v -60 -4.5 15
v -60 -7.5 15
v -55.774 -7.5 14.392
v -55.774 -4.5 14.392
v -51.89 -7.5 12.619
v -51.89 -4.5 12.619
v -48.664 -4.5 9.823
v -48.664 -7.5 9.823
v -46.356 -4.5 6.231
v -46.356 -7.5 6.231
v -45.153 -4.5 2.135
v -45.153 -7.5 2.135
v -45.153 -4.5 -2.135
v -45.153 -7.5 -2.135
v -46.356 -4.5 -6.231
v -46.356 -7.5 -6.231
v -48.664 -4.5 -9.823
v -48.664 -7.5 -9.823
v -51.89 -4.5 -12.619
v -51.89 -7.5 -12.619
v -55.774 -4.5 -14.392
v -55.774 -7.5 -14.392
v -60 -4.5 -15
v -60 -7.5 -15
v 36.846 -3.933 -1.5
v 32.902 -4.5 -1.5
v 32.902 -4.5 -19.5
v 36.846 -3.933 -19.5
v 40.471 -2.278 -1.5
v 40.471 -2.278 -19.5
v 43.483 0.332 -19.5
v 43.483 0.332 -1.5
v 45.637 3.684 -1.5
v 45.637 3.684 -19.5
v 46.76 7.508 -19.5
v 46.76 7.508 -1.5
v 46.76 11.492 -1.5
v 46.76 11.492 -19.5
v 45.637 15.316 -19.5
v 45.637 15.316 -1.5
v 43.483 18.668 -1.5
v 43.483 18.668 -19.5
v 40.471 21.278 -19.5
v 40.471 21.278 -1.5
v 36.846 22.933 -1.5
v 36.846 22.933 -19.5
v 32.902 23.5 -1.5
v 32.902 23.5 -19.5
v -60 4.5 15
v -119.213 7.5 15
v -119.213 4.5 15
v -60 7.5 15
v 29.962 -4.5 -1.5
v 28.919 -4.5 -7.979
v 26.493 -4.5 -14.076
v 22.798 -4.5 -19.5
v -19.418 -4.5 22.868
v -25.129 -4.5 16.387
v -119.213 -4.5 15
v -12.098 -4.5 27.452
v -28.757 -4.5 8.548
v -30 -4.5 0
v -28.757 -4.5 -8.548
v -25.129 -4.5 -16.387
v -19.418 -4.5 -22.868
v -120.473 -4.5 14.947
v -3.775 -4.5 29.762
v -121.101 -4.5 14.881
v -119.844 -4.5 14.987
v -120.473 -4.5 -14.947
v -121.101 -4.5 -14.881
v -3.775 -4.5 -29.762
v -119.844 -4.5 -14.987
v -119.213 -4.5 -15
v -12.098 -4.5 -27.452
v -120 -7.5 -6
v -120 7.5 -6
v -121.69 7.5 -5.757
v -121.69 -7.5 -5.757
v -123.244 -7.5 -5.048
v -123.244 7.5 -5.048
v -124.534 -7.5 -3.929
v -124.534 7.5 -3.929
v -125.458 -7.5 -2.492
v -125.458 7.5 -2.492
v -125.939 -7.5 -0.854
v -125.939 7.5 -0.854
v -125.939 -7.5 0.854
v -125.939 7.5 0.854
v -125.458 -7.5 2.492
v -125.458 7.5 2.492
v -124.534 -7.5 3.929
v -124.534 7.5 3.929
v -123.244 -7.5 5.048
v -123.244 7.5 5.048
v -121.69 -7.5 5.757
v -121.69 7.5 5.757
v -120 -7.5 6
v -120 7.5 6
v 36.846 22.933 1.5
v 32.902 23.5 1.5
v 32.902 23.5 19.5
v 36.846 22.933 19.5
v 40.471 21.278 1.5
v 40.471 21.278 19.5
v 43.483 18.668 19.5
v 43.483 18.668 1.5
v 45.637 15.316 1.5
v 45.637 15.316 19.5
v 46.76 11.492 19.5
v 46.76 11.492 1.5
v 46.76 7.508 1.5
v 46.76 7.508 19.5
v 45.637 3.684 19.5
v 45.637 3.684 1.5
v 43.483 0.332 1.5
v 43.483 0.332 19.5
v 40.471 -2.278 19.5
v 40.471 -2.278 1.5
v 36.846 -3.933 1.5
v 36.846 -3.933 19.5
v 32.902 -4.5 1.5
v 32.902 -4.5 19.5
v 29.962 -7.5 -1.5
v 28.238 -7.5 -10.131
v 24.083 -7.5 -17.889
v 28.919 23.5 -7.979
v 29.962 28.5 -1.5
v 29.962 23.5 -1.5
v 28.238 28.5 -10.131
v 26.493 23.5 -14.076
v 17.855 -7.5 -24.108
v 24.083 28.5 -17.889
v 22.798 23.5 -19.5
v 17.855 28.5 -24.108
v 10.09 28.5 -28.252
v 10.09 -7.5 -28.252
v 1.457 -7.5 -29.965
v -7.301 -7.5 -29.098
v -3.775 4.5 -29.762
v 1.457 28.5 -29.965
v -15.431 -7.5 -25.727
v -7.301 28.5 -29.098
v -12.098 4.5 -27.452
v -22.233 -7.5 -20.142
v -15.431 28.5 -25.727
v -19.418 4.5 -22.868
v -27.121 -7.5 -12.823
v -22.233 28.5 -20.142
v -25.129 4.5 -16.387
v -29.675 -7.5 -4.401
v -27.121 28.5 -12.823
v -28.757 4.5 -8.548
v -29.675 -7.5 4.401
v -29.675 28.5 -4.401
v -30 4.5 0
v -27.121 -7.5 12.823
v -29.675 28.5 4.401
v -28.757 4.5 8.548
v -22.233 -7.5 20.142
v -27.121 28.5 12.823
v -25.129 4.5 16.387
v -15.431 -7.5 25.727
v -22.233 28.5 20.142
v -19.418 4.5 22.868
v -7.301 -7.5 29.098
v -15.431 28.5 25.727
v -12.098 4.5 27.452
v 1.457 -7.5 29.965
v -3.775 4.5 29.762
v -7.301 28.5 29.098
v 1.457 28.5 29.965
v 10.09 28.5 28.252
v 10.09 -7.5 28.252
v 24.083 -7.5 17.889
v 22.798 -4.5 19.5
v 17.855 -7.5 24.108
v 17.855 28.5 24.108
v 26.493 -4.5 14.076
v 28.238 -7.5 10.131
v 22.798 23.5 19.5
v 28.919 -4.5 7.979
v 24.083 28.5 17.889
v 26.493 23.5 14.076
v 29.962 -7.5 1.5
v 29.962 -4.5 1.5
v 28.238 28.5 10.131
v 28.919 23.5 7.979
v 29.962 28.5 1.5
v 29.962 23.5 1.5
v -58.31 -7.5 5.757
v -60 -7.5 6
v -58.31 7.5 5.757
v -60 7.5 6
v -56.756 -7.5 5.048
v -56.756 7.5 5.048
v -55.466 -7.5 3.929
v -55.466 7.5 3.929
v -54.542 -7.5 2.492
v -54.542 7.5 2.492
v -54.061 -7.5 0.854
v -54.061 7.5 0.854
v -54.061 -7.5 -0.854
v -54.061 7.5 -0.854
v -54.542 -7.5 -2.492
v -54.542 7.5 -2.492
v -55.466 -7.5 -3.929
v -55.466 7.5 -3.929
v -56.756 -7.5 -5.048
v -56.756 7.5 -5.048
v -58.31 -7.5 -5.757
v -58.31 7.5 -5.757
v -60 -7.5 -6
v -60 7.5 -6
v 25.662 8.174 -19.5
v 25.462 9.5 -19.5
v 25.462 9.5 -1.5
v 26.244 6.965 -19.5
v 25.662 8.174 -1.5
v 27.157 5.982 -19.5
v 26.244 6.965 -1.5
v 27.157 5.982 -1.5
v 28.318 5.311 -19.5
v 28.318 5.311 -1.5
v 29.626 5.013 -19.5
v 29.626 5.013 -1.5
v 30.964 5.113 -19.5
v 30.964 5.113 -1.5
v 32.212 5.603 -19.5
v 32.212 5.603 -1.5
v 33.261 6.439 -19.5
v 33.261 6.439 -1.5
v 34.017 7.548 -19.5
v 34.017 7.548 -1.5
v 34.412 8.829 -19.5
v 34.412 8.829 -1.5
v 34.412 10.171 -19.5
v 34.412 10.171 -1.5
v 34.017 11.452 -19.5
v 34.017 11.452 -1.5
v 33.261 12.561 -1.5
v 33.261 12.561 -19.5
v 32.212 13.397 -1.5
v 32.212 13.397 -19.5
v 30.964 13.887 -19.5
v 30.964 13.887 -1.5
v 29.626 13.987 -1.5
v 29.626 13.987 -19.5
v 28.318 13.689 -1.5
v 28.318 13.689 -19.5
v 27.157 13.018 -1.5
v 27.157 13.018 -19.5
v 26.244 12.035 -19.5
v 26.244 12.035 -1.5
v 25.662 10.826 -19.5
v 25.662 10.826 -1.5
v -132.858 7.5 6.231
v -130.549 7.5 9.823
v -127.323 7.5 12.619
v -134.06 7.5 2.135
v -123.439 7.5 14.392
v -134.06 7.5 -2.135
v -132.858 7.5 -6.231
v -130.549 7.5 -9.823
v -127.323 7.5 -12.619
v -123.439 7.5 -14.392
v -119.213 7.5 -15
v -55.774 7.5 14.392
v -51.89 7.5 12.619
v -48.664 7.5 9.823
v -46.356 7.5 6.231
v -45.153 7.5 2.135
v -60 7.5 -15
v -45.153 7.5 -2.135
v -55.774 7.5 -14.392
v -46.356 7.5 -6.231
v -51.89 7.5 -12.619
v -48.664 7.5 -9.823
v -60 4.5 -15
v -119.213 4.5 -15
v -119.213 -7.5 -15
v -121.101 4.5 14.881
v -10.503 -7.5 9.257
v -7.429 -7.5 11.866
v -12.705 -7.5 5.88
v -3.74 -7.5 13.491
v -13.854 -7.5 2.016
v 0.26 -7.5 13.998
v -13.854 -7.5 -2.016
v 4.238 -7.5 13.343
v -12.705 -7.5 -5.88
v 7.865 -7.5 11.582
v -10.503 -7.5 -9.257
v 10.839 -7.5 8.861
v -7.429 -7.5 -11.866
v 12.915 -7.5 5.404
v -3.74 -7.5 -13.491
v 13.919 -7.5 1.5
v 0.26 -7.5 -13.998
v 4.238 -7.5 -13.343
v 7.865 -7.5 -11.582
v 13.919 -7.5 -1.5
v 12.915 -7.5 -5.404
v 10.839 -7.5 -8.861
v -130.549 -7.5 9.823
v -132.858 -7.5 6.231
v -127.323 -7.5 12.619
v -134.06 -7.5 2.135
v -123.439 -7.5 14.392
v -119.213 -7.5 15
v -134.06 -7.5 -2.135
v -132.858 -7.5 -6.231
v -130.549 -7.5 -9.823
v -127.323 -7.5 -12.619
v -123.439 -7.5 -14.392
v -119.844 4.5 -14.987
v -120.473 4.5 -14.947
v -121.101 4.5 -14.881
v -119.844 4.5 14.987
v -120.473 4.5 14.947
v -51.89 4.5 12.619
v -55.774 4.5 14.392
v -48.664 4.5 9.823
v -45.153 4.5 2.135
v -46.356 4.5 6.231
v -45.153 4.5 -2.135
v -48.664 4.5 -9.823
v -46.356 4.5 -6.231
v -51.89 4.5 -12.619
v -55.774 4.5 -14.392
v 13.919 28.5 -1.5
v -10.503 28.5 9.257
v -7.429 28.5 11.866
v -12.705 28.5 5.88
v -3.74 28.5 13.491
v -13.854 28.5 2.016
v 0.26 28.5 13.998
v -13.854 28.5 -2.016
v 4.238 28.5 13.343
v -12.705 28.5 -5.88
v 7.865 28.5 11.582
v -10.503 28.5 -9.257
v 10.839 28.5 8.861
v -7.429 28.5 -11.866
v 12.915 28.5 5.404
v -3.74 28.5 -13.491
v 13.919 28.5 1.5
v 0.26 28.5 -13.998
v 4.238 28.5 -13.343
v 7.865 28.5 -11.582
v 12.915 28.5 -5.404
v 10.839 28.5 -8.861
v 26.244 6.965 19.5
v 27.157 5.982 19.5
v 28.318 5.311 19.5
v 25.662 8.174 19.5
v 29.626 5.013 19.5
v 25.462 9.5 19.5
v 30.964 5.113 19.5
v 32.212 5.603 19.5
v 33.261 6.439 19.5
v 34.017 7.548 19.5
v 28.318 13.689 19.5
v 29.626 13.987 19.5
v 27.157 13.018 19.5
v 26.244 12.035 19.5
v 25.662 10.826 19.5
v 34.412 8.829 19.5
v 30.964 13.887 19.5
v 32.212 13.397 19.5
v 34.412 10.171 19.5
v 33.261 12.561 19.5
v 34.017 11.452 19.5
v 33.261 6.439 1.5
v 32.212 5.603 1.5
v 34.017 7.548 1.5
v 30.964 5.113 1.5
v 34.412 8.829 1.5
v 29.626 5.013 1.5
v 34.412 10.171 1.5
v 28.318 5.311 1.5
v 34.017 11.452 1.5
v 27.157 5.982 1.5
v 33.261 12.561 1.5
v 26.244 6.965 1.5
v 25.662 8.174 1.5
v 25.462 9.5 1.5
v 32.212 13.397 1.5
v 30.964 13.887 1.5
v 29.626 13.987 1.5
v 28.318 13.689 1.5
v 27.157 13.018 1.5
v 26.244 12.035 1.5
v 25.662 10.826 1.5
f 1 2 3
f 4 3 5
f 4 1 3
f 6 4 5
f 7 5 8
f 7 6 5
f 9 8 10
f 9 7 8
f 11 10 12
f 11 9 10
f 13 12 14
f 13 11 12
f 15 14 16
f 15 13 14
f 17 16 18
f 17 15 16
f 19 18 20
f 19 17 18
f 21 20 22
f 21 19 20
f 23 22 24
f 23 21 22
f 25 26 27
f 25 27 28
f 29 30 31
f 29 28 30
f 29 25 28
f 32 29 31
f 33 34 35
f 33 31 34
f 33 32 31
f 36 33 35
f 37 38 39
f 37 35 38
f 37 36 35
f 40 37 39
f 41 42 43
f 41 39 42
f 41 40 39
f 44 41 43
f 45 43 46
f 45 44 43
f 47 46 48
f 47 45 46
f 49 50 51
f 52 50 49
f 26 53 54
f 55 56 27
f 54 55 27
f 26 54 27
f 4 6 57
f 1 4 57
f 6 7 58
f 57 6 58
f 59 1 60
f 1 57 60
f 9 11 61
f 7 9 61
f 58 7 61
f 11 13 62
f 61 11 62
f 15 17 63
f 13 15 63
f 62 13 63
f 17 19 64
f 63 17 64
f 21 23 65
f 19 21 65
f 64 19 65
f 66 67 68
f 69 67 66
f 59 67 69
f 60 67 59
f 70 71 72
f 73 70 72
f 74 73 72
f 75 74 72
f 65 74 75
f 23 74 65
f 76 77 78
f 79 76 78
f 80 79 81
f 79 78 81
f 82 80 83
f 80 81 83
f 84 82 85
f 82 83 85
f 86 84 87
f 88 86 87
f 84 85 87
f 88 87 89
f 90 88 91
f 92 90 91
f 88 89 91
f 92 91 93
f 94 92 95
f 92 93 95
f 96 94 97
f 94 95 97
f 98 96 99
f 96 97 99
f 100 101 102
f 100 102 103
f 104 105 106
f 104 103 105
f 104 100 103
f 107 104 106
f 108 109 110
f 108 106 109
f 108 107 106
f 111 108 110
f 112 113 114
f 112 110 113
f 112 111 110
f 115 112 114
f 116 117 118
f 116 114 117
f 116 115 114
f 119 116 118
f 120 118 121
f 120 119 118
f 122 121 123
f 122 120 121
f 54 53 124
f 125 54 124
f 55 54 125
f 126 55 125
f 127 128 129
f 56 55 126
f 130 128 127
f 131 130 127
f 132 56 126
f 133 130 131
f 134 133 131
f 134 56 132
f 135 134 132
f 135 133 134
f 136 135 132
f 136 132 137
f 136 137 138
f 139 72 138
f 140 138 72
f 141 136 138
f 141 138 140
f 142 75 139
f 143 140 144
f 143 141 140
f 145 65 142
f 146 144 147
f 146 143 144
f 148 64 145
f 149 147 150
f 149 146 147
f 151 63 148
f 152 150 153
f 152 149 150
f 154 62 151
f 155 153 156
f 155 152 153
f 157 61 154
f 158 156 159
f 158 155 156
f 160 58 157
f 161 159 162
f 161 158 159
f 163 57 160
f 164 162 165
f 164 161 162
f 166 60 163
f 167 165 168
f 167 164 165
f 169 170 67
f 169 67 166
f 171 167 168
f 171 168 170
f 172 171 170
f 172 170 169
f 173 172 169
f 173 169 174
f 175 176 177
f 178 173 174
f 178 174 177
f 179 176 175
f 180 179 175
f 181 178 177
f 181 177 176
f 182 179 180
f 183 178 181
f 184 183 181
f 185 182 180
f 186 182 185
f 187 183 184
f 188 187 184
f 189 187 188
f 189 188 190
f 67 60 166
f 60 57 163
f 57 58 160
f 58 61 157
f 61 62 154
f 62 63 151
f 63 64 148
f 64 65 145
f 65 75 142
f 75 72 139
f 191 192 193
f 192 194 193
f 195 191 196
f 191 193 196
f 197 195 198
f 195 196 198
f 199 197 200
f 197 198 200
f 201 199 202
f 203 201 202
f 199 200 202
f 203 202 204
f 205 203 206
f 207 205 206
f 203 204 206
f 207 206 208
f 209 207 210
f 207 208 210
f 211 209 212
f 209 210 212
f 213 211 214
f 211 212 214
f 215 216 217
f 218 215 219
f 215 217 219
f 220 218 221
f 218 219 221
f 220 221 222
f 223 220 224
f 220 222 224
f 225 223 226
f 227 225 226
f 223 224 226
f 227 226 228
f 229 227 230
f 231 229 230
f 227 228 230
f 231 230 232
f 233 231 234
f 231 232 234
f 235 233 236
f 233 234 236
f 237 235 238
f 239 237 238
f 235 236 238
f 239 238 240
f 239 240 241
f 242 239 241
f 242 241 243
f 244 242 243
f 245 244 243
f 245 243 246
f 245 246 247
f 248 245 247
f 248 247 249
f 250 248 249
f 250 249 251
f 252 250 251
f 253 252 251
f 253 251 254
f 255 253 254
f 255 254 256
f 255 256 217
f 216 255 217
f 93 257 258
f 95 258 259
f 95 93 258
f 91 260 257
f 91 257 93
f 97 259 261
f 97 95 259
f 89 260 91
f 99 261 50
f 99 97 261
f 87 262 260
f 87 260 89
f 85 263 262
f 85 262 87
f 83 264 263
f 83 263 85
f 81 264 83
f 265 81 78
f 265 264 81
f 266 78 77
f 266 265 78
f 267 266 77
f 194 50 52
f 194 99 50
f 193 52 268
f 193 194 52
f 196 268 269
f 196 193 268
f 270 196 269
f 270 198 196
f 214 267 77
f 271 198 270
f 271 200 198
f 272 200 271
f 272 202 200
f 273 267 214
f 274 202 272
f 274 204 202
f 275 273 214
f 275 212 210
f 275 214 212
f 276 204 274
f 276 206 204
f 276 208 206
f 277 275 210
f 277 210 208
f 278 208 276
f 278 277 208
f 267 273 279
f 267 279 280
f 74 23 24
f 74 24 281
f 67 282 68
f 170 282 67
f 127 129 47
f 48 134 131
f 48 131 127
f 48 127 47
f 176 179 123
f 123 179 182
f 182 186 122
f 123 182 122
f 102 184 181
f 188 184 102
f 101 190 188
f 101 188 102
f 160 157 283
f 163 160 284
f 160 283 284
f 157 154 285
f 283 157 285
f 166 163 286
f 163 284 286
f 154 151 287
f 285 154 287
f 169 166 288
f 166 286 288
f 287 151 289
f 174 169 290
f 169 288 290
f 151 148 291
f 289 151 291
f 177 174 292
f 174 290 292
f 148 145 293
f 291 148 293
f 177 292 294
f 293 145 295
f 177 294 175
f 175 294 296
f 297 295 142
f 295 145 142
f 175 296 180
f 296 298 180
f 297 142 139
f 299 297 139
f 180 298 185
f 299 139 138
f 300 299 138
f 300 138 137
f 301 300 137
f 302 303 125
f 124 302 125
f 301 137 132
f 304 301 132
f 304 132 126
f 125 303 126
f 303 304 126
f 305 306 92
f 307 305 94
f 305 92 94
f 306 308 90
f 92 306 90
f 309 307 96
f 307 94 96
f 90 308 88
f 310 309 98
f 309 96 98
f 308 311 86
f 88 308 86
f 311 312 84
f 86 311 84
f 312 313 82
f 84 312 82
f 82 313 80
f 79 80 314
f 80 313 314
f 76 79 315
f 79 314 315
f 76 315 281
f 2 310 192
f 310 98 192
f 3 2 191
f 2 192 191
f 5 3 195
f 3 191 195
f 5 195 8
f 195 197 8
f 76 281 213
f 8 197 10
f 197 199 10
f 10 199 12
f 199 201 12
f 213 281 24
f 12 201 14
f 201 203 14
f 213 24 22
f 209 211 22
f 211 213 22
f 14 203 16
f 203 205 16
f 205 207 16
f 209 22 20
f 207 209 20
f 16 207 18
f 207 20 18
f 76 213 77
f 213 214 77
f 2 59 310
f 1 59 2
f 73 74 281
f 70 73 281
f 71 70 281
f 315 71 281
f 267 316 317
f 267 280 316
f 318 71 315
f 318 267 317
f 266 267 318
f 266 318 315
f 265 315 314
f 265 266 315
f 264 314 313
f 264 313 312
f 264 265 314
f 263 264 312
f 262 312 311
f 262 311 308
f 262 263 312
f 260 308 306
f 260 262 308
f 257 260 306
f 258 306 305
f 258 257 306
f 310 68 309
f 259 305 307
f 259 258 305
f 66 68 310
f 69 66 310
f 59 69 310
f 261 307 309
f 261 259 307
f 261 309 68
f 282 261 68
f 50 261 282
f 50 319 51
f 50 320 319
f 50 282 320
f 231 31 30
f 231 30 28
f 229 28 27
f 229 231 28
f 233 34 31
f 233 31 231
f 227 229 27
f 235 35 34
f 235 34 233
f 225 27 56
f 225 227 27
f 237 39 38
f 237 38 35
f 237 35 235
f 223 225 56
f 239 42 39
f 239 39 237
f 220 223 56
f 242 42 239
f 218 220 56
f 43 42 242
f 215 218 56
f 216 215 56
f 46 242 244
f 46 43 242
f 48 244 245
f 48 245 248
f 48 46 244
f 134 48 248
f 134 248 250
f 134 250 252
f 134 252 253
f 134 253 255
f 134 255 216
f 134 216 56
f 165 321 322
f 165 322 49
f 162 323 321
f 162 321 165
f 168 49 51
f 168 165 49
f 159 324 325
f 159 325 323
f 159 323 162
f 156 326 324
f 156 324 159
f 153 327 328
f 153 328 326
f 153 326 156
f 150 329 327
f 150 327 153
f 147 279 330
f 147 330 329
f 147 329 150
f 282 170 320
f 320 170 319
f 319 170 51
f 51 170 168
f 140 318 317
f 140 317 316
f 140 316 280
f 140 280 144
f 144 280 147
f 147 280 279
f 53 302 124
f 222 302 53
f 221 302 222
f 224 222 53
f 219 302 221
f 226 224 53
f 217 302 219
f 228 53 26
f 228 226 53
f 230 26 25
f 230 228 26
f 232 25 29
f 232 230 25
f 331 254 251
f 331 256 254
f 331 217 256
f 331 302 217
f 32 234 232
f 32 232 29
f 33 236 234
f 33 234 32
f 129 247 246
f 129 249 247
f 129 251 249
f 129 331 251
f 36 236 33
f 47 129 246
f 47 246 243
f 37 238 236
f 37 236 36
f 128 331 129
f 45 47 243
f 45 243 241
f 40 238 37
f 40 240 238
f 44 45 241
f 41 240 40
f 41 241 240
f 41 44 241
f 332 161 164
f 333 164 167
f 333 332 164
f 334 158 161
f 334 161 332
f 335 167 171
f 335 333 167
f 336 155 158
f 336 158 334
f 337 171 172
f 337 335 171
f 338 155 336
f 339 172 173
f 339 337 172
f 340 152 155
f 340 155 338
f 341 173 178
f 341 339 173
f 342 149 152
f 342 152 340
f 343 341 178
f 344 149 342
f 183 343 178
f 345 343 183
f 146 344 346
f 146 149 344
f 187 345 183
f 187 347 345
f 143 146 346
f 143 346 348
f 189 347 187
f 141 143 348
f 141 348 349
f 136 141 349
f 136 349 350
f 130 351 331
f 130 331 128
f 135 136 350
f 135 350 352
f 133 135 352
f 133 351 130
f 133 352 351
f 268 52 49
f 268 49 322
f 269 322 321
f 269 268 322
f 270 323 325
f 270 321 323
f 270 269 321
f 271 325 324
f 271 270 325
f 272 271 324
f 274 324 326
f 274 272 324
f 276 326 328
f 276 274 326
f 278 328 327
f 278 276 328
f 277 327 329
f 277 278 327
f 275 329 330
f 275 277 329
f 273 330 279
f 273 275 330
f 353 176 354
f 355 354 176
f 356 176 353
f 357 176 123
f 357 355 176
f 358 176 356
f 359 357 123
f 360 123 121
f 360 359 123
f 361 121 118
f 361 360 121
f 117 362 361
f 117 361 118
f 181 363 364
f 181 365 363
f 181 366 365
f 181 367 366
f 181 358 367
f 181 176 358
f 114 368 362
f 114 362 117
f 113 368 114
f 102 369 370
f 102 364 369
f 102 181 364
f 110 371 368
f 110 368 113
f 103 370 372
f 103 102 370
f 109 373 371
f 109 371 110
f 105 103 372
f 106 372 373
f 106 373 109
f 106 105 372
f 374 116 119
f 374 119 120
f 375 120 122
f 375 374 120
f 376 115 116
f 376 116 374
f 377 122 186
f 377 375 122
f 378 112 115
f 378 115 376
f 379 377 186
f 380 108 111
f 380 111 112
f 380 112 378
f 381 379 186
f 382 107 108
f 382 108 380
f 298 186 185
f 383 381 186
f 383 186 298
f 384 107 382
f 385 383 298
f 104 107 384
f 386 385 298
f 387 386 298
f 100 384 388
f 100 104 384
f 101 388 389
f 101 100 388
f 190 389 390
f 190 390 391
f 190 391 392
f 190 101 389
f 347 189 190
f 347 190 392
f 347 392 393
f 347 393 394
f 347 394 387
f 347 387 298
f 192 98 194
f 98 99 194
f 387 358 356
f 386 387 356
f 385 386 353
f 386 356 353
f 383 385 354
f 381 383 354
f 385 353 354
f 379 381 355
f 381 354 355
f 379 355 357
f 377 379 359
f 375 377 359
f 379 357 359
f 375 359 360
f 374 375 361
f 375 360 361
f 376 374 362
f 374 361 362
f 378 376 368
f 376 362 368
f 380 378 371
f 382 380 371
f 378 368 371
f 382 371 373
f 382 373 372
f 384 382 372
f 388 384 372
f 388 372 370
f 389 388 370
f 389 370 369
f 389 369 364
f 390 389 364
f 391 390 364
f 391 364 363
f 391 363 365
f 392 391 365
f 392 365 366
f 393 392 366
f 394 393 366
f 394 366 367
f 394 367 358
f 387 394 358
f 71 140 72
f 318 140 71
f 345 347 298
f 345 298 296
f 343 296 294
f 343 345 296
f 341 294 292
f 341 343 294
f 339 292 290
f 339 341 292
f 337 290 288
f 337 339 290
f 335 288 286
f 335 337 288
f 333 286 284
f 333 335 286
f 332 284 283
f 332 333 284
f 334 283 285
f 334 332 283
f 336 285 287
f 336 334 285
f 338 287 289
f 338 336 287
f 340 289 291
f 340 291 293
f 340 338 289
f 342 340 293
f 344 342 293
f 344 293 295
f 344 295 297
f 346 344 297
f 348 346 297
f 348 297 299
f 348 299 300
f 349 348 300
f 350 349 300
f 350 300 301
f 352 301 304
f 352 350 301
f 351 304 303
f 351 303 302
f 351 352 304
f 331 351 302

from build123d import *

# Parameters (mm, degrees)
BOSS_EXTRUDE1_DEPTH = 7.5
BOSS_EXTRUDE2_DEPTH = 4.5
BOSS_EXTRUDE3_START = 28.5
BOSS_EXTRUDE3_DEPTH = 36
BOSS_EXTRUDE4_START = 23.5
SKETCH1_5_W         = 16.939679335
SKETCH1_5_H         = 18
BOSS_EXTRUDE4_DEPTH = 28
FILLET1_RADIUS      = 14
FILLET1_LENGTH      = 18
FILLET2_RADIUS      = 14
FILLET2_LENGTH      = 18
SKETCH2_R           = 4.5
CUT_EXTRUDE1_DEPTH  = 146.8618303


with BuildPart() as part:
    # Sketch1 → Boss-Extrude1 (new, symmetric)
    with BuildSketch(Plane(origin=(0, 0, 0), x_dir=(1, 0, 0), z_dir=(0, 1, 0))):
        with BuildLine():
            Line((-119.21316455, -15), (-60, -15))
            ThreePointArc((-60, -15), (-45, 0), (-60, 15))
            Line((-60, 15), (-119.21316455, 15))
            ThreePointArc((-119.21316455, 15), (-134.21316455, 0), (-119.21316455, -15))
        make_face()
        with BuildLine():
            ThreePointArc((-120, 6), (-126, 0), (-120, -6))
            Line((-120, -6), (-60, -6))
            ThreePointArc((-60, -6), (-54, 0), (-60, 6))
            Line((-60, 6), (-120, 6))
        make_face(mode=Mode.SUBTRACT)
    extrude(amount=BOSS_EXTRUDE1_DEPTH, both=True)

    # Sketch1<3> → Boss-Extrude2 (add, symmetric)
    with BuildSketch(Plane(origin=(0, 0, 0), x_dir=(1, 0, 0), z_dir=(0, 1, 0))):
        with BuildLine():
            ThreePointArc((-121.100539999, 14.880786737), (-120.158732883, 14.970167017), (-119.21316455, 15))
            Line((-119.21316455, 15), (-60, 15))
            ThreePointArc((-60, 15), (-45, 0), (-60, -15))
            Line((-60, -15), (-119.21316455, -15))
            ThreePointArc((-119.21316455, -15), (-120.158732883, -14.970167017), (-121.100539999, -14.880786737))
            Line((-121.100539999, -14.880786737), (-3.774750899, -29.761573474))
            ThreePointArc((-3.774750899, -29.761573474), (-30, 0), (-3.774750899, 29.761573474))
            Line((-3.774750899, 29.761573474), (-121.100539999, 14.880786737))
        make_face()
    extrude(amount=BOSS_EXTRUDE2_DEPTH, both=True)

    # Sketch1<4> → Boss-Extrude3 (add)
    with BuildSketch(Plane(origin=(0, 0, 0), x_dir=(1, 0, 0), z_dir=(0, 1, 0)).offset(BOSS_EXTRUDE3_START)):
        with BuildLine():
            ThreePointArc((29.962476533, 1.5), (-30, 0), (29.962476533, -1.5))
            Line((29.962476533, -1.5), (13.919410907, -1.5))
            ThreePointArc((13.919410907, -1.5), (-14, 0), (13.919410907, 1.5))
            Line((13.919410907, 1.5), (29.962476533, 1.5))
        make_face()
    extrude(amount=-BOSS_EXTRUDE3_DEPTH)

    # Sketch1<5> → Boss-Extrude4 (add)
    with BuildSketch(Plane(origin=(0, 0, 0), x_dir=(1, 0, 0), z_dir=(0, 1, 0)).offset(BOSS_EXTRUDE4_START)):
        with BuildLine():
            ThreePointArc((29.962476533, -1.5), (27.873242778, -11.094247926), (22.79802623, -19.5))
            Line((22.79802623, -19.5), (29.962476533, -19.5))
            Line((29.962476533, -19.5), (29.962476533, -1.5))
        make_face()
        with Locations((38.4323162, -10.5)):
            Rectangle(SKETCH1_5_W, SKETCH1_5_H)
        with Locations((38.4323162, 10.5)):
            Rectangle(SKETCH1_5_W, SKETCH1_5_H)
        with BuildLine():
            Line((29.962476533, 19.5), (22.79802623, 19.5))
            ThreePointArc((22.79802623, 19.5), (27.873242778, 11.094247926), (29.962476533, 1.5))
            Line((29.962476533, 1.5), (29.962476533, 19.5))
        make_face()
    extrude(amount=-BOSS_EXTRUDE4_DEPTH)

    # Fillet1: full round fillet: the end face becomes a half cylinder, R = half its width
    fillet1_face = Plane((46.902155868, 9.5, 10.5), x_dir=(0, 0, -1), z_dir=(1, 0, 0))  # on the end face: x along it, z out of the body
    fillet1_slab = fillet1_face.offset(-FILLET1_RADIUS / 2) * Box(FILLET1_LENGTH, 2 * FILLET1_RADIUS, FILLET1_RADIUS, mode=Mode.PRIVATE)  # the body's end, R deep
    fillet1_round = Plane((32.902155868, 9.5, 10.5), x_dir=(1, 0, 0), z_dir=(0, 0, -1)) * Cylinder(FILLET1_RADIUS, FILLET1_LENGTH, mode=Mode.PRIVATE)  # its axis R under the face
    add(fillet1_slab - fillet1_round, mode=Mode.SUBTRACT)

    # Fillet2: full round fillet: the end face becomes a half cylinder, R = half its width
    fillet2_face = Plane((46.902155868, 9.5, -10.5), x_dir=(0, 0, 1), z_dir=(1, 0, 0))  # on the end face: x along it, z out of the body
    fillet2_slab = fillet2_face.offset(-FILLET2_RADIUS / 2) * Box(FILLET2_LENGTH, 2 * FILLET2_RADIUS, FILLET2_RADIUS, mode=Mode.PRIVATE)  # the body's end, R deep
    fillet2_round = Plane((32.902155868, 9.5, -10.5), x_dir=(1, 0, 0), z_dir=(0, 0, 1)) * Cylinder(FILLET2_RADIUS, FILLET2_LENGTH, mode=Mode.PRIVATE)  # its axis R under the face
    add(fillet2_slab - fillet2_round, mode=Mode.SUBTRACT)

    # Sketch2 → Cut-Extrude1 (cut, through all)
    with BuildSketch(Plane.XY.offset(19.5)):
        with Locations(Location((29.962476533, 9.5, 0), (0, 0, 180))):
            Circle(SKETCH2_R)
    extrude(amount=-CUT_EXTRUDE1_DEPTH, mode=Mode.SUBTRACT)


solid = part.part
